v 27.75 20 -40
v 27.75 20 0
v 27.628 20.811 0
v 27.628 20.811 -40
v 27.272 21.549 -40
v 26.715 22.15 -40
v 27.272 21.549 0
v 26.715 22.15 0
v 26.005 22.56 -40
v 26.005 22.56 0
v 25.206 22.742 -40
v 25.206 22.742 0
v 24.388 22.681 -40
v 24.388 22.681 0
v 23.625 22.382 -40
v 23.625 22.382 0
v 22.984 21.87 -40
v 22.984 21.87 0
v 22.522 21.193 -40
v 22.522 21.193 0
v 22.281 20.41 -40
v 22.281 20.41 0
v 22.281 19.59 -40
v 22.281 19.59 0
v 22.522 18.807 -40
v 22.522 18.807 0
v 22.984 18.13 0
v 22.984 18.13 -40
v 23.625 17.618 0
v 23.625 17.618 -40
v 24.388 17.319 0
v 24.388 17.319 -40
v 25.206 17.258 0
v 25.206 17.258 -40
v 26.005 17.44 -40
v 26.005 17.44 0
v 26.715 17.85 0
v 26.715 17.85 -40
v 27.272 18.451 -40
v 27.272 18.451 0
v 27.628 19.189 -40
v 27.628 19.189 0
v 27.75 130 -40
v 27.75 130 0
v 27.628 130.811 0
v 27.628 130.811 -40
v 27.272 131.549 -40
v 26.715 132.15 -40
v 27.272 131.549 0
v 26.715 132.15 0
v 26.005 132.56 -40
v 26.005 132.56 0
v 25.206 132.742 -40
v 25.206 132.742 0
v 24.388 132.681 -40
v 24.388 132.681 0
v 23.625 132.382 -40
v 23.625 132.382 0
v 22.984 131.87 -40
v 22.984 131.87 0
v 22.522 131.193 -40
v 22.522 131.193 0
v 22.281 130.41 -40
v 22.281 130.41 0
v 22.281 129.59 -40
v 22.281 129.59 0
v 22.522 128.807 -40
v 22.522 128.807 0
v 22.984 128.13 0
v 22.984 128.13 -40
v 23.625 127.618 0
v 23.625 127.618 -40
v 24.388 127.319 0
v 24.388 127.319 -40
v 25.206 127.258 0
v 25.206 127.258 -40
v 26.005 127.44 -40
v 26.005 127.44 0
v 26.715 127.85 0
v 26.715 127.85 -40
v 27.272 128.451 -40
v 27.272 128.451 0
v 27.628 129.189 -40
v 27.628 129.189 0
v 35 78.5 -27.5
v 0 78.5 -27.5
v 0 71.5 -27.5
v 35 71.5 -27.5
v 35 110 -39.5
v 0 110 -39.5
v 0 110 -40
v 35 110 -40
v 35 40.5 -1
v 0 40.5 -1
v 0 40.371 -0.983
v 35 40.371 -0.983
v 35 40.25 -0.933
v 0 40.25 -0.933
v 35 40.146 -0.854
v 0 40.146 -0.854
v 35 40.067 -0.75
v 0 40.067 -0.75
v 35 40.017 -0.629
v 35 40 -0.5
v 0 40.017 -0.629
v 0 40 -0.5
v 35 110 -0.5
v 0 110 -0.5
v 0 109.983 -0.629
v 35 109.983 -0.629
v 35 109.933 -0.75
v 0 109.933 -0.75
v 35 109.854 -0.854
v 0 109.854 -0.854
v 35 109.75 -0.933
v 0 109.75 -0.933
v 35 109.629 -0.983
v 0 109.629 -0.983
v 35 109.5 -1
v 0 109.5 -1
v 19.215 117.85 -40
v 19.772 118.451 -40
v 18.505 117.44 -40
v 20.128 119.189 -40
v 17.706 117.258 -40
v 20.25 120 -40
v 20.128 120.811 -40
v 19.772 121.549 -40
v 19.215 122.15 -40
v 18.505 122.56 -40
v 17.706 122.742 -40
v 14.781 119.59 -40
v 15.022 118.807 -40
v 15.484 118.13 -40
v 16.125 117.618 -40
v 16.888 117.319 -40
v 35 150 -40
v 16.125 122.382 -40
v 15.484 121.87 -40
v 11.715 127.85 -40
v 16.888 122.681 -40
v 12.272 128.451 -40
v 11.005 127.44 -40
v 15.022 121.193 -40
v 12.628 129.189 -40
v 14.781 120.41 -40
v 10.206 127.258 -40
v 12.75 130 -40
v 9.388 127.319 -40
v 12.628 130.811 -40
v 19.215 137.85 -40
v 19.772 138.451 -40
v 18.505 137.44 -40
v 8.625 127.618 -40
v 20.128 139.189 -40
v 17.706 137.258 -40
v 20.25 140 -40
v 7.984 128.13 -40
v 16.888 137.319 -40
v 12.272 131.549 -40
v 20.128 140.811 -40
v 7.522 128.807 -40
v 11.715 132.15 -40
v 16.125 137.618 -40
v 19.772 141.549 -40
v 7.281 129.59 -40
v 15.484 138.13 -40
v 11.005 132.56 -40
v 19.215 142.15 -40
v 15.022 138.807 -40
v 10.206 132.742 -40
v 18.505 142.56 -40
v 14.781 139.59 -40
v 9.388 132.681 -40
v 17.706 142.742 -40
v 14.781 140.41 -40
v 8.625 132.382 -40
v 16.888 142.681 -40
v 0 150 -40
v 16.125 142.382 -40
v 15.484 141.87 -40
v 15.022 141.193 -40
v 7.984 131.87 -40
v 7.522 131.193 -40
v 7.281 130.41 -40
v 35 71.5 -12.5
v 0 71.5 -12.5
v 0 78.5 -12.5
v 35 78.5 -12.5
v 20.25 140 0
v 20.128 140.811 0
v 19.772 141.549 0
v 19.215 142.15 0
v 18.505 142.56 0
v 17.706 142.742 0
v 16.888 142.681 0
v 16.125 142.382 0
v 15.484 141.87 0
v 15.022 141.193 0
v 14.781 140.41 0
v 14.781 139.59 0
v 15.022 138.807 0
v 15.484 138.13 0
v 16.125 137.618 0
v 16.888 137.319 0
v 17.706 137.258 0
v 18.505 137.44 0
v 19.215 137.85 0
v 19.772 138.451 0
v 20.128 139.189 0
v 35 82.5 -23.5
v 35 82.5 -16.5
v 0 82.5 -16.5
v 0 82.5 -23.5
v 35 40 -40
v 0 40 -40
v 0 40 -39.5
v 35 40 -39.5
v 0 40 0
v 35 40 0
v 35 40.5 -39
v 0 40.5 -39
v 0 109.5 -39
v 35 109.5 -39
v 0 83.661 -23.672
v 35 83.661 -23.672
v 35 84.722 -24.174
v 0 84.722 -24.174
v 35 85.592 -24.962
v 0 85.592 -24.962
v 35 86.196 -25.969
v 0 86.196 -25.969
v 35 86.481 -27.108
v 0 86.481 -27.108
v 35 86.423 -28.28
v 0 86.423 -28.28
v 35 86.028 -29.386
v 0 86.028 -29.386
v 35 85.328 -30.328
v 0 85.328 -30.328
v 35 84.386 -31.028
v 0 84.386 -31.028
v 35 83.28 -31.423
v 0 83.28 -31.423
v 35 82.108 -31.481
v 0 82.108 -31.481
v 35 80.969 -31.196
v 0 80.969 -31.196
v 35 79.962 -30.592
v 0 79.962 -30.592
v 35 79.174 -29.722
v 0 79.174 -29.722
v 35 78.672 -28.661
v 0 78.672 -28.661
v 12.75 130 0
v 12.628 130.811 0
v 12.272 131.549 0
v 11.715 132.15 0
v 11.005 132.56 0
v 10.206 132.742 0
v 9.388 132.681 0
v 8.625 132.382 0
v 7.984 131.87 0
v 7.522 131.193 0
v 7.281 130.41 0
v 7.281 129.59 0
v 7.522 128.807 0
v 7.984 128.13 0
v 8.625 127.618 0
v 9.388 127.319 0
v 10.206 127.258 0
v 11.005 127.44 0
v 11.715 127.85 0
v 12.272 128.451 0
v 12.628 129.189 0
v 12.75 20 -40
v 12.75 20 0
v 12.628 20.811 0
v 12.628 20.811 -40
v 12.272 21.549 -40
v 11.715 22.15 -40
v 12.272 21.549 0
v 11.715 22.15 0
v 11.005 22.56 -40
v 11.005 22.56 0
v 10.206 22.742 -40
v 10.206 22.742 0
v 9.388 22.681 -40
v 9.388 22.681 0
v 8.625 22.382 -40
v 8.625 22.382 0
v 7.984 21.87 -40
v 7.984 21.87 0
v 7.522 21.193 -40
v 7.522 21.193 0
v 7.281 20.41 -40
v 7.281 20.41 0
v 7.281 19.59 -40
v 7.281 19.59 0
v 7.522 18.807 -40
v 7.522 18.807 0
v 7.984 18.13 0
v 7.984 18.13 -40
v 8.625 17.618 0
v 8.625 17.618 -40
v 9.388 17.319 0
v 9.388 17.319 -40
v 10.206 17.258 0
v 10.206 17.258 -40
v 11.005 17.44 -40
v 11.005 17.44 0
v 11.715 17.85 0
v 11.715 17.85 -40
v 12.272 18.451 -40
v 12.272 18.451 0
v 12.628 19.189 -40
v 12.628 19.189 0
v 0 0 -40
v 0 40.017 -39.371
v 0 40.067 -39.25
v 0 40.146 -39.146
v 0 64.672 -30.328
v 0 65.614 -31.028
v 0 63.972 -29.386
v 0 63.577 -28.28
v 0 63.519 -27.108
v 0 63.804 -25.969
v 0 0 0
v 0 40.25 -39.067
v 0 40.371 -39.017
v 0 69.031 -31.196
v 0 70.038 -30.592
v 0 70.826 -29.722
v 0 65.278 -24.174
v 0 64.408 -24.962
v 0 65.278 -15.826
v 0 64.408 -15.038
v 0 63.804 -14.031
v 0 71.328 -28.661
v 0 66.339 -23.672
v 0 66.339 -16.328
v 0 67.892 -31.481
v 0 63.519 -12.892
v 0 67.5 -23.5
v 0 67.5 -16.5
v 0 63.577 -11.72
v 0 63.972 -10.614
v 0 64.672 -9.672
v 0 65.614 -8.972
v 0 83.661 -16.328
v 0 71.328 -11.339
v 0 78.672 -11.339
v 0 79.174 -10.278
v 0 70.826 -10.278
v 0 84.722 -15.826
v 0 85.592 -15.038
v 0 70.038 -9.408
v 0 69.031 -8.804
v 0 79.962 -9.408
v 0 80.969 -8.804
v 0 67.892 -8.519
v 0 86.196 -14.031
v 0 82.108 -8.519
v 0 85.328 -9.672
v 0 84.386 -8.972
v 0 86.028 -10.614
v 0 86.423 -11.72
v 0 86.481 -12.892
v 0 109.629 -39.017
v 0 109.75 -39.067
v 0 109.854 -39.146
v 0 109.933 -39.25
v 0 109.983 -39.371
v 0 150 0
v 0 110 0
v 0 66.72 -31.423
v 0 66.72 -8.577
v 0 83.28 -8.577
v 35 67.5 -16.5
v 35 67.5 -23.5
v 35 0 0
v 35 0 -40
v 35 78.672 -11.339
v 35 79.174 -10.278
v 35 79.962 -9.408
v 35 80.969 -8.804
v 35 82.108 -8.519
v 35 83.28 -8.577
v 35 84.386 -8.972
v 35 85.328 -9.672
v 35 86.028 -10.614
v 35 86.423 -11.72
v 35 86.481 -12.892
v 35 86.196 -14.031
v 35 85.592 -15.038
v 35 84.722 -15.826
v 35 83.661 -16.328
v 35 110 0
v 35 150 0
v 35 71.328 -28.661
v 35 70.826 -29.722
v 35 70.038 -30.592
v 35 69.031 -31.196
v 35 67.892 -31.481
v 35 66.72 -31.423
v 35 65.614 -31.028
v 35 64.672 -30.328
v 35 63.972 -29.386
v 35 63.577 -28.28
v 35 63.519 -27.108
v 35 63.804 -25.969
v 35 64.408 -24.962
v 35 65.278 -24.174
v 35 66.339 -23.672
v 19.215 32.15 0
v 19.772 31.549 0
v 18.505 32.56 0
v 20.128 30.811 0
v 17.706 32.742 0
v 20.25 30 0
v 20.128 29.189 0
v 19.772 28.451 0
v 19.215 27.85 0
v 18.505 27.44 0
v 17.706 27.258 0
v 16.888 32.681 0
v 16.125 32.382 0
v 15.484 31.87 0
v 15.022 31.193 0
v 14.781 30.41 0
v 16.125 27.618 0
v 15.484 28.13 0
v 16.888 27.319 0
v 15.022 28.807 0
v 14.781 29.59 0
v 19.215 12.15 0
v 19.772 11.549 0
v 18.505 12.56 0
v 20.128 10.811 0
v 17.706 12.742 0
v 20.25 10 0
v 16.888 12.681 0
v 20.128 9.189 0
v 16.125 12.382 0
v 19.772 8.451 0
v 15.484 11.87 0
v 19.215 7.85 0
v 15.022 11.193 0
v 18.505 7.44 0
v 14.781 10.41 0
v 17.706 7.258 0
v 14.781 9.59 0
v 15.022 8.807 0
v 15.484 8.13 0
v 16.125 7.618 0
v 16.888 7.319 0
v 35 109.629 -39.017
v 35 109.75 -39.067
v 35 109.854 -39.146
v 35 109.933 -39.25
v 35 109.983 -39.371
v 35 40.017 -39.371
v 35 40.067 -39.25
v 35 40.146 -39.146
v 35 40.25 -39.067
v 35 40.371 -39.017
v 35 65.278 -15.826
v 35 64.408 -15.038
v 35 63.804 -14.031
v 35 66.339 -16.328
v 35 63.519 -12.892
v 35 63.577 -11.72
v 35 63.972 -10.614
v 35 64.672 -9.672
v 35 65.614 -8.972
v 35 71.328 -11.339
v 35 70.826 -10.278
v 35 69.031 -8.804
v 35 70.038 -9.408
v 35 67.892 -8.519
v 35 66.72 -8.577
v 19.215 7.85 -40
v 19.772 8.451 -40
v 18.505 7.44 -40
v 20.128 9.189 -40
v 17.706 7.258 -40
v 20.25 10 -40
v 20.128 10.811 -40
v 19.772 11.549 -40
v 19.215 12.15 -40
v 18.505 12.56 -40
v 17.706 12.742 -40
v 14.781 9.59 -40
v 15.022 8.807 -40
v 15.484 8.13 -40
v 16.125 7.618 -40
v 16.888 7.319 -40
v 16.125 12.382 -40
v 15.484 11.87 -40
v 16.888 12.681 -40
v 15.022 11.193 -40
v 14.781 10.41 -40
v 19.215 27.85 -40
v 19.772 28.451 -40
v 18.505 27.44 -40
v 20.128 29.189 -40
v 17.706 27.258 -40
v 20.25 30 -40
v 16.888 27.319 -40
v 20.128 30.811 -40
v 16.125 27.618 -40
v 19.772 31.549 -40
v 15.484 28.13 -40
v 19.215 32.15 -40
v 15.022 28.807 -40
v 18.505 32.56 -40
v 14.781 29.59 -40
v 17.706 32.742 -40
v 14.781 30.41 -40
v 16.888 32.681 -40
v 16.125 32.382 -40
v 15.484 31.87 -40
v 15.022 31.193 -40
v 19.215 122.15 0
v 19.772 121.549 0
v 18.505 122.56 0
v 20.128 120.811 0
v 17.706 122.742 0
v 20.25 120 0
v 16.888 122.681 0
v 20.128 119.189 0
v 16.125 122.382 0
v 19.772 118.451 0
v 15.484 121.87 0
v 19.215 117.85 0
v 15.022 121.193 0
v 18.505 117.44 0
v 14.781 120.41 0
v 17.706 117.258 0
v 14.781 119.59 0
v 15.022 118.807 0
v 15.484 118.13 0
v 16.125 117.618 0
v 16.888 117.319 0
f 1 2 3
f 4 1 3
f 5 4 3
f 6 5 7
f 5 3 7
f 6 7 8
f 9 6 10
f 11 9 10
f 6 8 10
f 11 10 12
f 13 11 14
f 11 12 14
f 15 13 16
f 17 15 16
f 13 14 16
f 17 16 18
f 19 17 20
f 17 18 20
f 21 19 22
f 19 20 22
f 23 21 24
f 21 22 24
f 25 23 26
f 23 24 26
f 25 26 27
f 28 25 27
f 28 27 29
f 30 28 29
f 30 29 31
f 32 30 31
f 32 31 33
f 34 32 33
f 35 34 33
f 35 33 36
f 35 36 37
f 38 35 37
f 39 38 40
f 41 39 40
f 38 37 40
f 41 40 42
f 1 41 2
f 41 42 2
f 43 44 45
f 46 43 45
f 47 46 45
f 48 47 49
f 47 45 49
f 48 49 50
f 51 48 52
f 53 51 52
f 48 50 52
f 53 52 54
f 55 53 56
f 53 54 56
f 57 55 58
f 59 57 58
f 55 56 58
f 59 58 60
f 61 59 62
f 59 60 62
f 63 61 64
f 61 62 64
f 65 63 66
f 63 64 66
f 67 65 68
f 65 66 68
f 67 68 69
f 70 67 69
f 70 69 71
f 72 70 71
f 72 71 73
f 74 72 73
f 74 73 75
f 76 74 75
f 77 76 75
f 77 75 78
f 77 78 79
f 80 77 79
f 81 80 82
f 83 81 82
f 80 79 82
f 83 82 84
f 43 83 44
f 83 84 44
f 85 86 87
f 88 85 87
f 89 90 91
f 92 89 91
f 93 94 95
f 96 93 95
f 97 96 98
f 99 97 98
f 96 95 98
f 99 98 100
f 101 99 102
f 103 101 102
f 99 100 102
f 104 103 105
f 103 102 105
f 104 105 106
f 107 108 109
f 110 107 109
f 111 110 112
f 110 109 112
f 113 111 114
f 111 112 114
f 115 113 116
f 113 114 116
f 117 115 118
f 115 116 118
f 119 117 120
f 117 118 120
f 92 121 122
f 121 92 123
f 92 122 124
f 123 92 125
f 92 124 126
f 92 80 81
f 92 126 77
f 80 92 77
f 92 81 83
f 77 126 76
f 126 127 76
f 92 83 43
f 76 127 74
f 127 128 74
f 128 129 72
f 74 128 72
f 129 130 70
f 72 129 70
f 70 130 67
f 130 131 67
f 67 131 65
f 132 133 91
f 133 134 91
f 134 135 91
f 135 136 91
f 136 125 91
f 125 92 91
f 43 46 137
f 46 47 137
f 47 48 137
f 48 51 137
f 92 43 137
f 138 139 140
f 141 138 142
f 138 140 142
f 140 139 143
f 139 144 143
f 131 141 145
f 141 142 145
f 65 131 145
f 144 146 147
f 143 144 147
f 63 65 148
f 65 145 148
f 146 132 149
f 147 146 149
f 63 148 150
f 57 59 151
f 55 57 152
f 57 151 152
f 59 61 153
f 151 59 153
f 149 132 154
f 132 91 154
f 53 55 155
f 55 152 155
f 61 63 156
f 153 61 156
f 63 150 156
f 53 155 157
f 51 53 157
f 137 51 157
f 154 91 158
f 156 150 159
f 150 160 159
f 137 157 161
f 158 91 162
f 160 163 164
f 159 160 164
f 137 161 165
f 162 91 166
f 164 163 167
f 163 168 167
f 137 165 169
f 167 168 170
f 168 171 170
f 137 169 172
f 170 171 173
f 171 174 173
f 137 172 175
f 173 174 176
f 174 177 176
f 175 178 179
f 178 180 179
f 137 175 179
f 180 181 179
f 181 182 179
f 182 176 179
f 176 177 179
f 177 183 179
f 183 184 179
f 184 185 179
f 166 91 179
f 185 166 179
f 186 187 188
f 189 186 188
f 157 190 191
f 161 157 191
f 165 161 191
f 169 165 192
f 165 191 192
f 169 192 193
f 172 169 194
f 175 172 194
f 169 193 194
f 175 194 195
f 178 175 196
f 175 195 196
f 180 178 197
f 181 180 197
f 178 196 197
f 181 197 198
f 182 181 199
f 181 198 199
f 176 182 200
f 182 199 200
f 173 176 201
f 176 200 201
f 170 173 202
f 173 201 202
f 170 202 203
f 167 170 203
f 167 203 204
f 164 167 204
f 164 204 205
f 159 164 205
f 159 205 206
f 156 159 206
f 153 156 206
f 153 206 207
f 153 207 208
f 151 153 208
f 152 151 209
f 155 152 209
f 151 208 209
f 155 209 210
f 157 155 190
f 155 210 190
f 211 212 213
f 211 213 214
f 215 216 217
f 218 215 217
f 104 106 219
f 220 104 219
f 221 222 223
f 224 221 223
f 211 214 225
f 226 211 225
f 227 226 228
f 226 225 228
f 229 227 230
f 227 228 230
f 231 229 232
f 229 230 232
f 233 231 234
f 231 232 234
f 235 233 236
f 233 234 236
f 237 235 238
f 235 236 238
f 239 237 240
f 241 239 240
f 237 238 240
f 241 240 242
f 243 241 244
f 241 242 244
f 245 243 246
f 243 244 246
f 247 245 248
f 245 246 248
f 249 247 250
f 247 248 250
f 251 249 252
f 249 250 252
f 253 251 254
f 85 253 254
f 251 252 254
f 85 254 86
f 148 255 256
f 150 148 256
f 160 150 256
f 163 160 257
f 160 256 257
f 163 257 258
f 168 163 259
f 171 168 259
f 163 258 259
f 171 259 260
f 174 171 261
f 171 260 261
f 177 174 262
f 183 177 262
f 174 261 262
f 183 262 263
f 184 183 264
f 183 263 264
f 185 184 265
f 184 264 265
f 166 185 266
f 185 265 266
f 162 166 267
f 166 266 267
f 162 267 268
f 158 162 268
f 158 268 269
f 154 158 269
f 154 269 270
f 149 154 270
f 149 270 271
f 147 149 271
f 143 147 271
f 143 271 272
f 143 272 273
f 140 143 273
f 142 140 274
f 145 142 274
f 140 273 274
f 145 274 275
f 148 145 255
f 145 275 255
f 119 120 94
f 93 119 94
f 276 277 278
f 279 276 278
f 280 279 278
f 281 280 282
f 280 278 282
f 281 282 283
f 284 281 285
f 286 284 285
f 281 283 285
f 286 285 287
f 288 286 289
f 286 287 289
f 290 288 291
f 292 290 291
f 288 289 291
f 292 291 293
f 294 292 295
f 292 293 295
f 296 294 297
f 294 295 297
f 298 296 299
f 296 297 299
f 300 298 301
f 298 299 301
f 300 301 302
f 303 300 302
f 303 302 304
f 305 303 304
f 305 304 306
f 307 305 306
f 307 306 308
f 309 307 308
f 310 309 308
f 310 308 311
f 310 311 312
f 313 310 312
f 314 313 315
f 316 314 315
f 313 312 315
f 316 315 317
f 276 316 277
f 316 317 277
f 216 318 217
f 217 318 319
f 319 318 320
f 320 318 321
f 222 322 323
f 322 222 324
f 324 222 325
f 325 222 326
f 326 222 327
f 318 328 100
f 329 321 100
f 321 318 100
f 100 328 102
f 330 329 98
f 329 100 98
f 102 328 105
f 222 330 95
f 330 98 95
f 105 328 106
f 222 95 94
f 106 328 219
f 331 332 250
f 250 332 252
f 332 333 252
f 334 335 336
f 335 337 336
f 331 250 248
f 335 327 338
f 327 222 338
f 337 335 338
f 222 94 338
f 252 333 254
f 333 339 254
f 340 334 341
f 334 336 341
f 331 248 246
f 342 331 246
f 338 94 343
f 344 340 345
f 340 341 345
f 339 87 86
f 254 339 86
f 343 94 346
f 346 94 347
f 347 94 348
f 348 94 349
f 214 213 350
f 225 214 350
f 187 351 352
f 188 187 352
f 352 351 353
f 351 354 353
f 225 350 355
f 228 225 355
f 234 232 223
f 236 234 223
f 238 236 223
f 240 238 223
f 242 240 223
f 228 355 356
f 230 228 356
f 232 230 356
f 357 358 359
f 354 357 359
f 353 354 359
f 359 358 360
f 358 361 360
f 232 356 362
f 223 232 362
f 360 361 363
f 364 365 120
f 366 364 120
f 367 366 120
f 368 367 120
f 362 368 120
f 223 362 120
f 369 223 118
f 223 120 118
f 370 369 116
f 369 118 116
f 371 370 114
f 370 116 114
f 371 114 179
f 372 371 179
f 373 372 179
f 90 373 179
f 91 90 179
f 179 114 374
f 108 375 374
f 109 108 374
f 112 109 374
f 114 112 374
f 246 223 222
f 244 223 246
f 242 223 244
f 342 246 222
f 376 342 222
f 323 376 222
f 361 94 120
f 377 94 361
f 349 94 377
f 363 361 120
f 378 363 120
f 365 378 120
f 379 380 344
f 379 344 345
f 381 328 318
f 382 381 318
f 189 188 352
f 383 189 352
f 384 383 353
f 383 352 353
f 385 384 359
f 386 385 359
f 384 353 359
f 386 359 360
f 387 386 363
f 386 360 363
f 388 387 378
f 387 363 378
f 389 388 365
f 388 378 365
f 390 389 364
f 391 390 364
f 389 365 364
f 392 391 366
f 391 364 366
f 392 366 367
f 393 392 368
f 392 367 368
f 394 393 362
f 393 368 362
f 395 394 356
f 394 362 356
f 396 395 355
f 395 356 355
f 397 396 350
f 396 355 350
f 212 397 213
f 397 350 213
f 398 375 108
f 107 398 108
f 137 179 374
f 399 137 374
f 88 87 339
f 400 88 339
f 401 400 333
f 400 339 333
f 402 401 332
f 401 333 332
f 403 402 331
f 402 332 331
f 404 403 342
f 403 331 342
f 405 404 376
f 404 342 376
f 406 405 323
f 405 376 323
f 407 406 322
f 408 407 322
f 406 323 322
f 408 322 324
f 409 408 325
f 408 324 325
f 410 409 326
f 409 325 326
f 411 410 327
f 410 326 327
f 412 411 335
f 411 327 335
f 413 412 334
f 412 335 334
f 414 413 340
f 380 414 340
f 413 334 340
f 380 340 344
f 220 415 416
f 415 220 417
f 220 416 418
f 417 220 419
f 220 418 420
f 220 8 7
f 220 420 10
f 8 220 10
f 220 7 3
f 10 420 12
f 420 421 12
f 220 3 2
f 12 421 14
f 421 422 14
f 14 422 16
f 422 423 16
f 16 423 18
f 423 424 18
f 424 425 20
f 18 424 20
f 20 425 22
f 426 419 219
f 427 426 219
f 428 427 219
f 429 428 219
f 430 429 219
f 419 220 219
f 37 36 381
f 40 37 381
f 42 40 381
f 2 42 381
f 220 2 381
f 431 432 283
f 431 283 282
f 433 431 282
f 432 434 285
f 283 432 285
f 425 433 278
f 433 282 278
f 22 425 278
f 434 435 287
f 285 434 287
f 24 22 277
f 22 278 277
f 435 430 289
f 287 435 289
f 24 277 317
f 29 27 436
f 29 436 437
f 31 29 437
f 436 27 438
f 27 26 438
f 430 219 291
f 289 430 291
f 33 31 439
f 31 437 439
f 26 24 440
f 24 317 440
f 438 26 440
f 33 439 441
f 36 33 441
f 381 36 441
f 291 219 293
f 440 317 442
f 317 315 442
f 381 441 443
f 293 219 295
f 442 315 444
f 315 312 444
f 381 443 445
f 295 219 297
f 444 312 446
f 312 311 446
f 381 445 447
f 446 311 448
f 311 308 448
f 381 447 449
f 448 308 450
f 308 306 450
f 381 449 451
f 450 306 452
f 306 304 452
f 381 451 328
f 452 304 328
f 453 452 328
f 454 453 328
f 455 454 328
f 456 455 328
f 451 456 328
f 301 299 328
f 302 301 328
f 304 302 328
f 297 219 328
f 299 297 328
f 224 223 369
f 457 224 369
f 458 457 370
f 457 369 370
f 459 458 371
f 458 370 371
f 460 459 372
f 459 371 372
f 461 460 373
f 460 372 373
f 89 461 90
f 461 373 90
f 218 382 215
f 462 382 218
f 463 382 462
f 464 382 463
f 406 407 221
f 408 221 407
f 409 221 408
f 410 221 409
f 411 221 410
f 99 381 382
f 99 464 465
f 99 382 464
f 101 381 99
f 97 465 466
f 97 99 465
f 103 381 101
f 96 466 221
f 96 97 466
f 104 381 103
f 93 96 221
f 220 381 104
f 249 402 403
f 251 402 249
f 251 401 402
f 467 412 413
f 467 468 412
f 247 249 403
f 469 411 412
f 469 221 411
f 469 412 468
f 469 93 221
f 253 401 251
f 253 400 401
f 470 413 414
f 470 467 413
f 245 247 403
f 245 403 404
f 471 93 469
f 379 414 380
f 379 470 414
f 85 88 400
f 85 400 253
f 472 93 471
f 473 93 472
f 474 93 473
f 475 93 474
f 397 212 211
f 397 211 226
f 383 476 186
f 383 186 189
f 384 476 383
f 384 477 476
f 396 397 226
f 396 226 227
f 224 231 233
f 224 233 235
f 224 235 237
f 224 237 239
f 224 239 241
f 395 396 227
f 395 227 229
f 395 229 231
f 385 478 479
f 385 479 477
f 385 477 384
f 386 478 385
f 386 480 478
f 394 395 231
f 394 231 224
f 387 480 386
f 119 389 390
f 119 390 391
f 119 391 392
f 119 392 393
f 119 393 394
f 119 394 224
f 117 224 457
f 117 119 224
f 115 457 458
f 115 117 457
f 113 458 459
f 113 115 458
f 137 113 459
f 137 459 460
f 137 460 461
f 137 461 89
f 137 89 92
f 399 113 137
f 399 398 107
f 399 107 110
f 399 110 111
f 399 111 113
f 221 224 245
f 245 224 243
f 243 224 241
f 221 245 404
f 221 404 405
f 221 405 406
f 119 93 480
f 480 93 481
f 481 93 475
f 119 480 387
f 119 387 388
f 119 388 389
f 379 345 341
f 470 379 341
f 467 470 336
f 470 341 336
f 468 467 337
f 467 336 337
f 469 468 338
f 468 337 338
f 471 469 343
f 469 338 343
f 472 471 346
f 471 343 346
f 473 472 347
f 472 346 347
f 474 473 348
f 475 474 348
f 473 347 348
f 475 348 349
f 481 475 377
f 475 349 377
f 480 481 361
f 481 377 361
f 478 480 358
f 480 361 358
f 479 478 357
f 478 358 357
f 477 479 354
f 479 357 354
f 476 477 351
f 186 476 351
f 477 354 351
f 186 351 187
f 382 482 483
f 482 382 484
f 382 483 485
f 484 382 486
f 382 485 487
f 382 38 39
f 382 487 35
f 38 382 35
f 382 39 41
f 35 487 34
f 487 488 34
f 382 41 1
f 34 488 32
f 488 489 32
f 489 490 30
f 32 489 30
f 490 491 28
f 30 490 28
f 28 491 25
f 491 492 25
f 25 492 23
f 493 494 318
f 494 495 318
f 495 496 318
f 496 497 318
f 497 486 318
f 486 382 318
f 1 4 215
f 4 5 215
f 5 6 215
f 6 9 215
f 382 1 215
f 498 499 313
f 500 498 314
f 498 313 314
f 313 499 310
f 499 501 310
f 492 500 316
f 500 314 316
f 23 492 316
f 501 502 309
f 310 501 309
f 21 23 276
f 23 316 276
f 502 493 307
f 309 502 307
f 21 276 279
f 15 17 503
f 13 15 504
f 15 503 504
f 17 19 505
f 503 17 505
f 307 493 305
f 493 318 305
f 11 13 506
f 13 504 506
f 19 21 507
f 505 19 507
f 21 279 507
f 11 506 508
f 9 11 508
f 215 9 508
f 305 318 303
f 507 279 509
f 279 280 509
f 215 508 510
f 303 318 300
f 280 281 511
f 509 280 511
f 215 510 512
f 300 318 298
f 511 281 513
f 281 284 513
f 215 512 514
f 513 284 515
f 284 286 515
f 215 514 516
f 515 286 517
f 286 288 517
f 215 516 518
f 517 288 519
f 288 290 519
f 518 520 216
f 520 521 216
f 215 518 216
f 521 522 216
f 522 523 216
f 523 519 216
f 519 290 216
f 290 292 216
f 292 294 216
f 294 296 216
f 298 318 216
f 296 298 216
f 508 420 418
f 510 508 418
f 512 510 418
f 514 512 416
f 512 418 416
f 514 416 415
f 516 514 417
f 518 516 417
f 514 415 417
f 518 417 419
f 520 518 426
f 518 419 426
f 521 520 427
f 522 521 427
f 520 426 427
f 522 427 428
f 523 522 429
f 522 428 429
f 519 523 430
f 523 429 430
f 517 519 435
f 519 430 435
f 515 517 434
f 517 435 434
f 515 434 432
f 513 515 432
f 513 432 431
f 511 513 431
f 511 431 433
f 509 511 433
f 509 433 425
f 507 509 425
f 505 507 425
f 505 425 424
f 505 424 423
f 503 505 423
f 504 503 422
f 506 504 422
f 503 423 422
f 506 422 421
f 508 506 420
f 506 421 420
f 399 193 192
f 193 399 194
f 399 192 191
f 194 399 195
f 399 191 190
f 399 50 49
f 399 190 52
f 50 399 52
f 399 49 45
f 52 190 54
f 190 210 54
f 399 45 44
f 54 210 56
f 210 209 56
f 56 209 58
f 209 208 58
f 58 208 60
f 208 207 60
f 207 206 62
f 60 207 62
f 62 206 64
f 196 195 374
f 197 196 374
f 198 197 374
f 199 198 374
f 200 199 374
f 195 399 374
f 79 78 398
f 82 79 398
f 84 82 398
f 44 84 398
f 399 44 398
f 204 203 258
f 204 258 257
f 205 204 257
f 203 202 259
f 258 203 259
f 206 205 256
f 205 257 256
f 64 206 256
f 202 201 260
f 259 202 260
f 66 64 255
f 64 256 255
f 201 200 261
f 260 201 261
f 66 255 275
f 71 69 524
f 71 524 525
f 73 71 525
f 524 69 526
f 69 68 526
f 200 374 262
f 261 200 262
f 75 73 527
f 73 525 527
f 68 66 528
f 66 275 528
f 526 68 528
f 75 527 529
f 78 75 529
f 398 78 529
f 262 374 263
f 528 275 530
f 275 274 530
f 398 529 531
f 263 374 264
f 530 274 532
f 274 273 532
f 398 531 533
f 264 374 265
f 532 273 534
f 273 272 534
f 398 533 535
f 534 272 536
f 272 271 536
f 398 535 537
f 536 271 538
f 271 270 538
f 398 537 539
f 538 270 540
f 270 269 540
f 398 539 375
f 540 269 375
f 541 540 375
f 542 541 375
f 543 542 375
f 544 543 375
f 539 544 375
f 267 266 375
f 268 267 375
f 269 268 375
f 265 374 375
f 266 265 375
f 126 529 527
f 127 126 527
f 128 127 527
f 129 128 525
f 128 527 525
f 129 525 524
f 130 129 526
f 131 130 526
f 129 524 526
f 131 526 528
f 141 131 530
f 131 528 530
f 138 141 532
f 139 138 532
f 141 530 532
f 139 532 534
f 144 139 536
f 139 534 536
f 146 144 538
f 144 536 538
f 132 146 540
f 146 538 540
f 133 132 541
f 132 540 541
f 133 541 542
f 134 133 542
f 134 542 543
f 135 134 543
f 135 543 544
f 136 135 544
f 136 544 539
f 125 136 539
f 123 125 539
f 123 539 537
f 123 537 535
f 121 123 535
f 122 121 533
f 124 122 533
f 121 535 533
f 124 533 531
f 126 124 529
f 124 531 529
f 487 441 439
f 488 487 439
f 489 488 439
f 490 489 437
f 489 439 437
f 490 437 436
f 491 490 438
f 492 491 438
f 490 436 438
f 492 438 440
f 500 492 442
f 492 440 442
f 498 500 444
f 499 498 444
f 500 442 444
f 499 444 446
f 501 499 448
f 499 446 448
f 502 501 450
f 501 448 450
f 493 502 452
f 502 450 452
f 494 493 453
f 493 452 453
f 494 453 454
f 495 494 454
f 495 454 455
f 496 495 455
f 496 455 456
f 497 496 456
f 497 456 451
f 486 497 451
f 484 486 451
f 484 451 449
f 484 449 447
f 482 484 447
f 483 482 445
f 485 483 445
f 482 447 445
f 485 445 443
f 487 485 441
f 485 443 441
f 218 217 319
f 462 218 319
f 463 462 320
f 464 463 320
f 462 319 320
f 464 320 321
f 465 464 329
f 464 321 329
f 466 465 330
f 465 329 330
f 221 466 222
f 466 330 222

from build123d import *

# Parameters (mm, degrees)
F1_DEPTH = 35
F2_R     = 2.75
F3_DEPTH = 40


with BuildPart() as f1:
    # F0 (on Right) → F1 (new body)
    with BuildSketch(Plane.YZ):
        with BuildLine():
            Line((40, 0), (0, 0))
            Line((0, 0), (0, -40))
            Line((0, -40), (40, -40))
            Line((40, -40), (40, -39.5))
            ThreePointArc((40, -39.5), (40.146447, -39.146447), (40.5, -39))
            Line((40.5, -39), (109.5, -39))
            ThreePointArc((109.5, -39), (109.853553, -39.146447), (110, -39.5))
            Line((110, -39.5), (110, -40))
            Line((110, -40), (150, -40))
            Line((150, -40), (150, 0))
            Line((150, 0), (110, 0))
            Line((110, 0), (110, -0.5))
            ThreePointArc((110, -0.5), (109.853553, -0.853553), (109.5, -1))
            Line((109.5, -1), (40.5, -1))
            ThreePointArc((40.5, -1), (40.146447, -0.853553), (40, -0.5))
            Line((40, -0.5), (40, 0))
        make_face()
        with BuildLine():
            ThreePointArc((67.5, -16.5), (64.671573, -9.671573), (71.5, -12.5))
            Line((71.5, -12.5), (78.5, -12.5))
            ThreePointArc((78.5, -12.5), (85.328427, -9.671573), (82.5, -16.5))
            Line((82.5, -16.5), (82.5, -23.5))
            ThreePointArc((82.5, -23.5), (85.328427, -30.328427), (78.5, -27.5))
            Line((78.5, -27.5), (71.5, -27.5))
            ThreePointArc((71.5, -27.5), (64.671573, -30.328427), (67.5, -23.5))
            Line((67.5, -23.5), (67.5, -16.5))
        make_face(mode=Mode.SUBTRACT)
    extrude(amount=F1_DEPTH)

    # F2 (on face) → F3 (cut, through all)
    with BuildSketch(Plane.XY):
        with Locations((17.5, 10)):
            Circle(F2_R)
        with Locations((17.5, 30)):
            Circle(F2_R)
        with Locations((25, 20)):
            Circle(F2_R)
        with Locations((10, 20)):
            Circle(F2_R)
        with Locations((17.5, 120)):
            Circle(F2_R)
        with Locations((17.5, 140)):
            Circle(F2_R)
        with Locations((25, 130)):
            Circle(F2_R)
        with Locations((10, 130)):
            Circle(F2_R)
    extrude(amount=-F3_DEPTH, mode=Mode.SUBTRACT)


solid = f1.part
